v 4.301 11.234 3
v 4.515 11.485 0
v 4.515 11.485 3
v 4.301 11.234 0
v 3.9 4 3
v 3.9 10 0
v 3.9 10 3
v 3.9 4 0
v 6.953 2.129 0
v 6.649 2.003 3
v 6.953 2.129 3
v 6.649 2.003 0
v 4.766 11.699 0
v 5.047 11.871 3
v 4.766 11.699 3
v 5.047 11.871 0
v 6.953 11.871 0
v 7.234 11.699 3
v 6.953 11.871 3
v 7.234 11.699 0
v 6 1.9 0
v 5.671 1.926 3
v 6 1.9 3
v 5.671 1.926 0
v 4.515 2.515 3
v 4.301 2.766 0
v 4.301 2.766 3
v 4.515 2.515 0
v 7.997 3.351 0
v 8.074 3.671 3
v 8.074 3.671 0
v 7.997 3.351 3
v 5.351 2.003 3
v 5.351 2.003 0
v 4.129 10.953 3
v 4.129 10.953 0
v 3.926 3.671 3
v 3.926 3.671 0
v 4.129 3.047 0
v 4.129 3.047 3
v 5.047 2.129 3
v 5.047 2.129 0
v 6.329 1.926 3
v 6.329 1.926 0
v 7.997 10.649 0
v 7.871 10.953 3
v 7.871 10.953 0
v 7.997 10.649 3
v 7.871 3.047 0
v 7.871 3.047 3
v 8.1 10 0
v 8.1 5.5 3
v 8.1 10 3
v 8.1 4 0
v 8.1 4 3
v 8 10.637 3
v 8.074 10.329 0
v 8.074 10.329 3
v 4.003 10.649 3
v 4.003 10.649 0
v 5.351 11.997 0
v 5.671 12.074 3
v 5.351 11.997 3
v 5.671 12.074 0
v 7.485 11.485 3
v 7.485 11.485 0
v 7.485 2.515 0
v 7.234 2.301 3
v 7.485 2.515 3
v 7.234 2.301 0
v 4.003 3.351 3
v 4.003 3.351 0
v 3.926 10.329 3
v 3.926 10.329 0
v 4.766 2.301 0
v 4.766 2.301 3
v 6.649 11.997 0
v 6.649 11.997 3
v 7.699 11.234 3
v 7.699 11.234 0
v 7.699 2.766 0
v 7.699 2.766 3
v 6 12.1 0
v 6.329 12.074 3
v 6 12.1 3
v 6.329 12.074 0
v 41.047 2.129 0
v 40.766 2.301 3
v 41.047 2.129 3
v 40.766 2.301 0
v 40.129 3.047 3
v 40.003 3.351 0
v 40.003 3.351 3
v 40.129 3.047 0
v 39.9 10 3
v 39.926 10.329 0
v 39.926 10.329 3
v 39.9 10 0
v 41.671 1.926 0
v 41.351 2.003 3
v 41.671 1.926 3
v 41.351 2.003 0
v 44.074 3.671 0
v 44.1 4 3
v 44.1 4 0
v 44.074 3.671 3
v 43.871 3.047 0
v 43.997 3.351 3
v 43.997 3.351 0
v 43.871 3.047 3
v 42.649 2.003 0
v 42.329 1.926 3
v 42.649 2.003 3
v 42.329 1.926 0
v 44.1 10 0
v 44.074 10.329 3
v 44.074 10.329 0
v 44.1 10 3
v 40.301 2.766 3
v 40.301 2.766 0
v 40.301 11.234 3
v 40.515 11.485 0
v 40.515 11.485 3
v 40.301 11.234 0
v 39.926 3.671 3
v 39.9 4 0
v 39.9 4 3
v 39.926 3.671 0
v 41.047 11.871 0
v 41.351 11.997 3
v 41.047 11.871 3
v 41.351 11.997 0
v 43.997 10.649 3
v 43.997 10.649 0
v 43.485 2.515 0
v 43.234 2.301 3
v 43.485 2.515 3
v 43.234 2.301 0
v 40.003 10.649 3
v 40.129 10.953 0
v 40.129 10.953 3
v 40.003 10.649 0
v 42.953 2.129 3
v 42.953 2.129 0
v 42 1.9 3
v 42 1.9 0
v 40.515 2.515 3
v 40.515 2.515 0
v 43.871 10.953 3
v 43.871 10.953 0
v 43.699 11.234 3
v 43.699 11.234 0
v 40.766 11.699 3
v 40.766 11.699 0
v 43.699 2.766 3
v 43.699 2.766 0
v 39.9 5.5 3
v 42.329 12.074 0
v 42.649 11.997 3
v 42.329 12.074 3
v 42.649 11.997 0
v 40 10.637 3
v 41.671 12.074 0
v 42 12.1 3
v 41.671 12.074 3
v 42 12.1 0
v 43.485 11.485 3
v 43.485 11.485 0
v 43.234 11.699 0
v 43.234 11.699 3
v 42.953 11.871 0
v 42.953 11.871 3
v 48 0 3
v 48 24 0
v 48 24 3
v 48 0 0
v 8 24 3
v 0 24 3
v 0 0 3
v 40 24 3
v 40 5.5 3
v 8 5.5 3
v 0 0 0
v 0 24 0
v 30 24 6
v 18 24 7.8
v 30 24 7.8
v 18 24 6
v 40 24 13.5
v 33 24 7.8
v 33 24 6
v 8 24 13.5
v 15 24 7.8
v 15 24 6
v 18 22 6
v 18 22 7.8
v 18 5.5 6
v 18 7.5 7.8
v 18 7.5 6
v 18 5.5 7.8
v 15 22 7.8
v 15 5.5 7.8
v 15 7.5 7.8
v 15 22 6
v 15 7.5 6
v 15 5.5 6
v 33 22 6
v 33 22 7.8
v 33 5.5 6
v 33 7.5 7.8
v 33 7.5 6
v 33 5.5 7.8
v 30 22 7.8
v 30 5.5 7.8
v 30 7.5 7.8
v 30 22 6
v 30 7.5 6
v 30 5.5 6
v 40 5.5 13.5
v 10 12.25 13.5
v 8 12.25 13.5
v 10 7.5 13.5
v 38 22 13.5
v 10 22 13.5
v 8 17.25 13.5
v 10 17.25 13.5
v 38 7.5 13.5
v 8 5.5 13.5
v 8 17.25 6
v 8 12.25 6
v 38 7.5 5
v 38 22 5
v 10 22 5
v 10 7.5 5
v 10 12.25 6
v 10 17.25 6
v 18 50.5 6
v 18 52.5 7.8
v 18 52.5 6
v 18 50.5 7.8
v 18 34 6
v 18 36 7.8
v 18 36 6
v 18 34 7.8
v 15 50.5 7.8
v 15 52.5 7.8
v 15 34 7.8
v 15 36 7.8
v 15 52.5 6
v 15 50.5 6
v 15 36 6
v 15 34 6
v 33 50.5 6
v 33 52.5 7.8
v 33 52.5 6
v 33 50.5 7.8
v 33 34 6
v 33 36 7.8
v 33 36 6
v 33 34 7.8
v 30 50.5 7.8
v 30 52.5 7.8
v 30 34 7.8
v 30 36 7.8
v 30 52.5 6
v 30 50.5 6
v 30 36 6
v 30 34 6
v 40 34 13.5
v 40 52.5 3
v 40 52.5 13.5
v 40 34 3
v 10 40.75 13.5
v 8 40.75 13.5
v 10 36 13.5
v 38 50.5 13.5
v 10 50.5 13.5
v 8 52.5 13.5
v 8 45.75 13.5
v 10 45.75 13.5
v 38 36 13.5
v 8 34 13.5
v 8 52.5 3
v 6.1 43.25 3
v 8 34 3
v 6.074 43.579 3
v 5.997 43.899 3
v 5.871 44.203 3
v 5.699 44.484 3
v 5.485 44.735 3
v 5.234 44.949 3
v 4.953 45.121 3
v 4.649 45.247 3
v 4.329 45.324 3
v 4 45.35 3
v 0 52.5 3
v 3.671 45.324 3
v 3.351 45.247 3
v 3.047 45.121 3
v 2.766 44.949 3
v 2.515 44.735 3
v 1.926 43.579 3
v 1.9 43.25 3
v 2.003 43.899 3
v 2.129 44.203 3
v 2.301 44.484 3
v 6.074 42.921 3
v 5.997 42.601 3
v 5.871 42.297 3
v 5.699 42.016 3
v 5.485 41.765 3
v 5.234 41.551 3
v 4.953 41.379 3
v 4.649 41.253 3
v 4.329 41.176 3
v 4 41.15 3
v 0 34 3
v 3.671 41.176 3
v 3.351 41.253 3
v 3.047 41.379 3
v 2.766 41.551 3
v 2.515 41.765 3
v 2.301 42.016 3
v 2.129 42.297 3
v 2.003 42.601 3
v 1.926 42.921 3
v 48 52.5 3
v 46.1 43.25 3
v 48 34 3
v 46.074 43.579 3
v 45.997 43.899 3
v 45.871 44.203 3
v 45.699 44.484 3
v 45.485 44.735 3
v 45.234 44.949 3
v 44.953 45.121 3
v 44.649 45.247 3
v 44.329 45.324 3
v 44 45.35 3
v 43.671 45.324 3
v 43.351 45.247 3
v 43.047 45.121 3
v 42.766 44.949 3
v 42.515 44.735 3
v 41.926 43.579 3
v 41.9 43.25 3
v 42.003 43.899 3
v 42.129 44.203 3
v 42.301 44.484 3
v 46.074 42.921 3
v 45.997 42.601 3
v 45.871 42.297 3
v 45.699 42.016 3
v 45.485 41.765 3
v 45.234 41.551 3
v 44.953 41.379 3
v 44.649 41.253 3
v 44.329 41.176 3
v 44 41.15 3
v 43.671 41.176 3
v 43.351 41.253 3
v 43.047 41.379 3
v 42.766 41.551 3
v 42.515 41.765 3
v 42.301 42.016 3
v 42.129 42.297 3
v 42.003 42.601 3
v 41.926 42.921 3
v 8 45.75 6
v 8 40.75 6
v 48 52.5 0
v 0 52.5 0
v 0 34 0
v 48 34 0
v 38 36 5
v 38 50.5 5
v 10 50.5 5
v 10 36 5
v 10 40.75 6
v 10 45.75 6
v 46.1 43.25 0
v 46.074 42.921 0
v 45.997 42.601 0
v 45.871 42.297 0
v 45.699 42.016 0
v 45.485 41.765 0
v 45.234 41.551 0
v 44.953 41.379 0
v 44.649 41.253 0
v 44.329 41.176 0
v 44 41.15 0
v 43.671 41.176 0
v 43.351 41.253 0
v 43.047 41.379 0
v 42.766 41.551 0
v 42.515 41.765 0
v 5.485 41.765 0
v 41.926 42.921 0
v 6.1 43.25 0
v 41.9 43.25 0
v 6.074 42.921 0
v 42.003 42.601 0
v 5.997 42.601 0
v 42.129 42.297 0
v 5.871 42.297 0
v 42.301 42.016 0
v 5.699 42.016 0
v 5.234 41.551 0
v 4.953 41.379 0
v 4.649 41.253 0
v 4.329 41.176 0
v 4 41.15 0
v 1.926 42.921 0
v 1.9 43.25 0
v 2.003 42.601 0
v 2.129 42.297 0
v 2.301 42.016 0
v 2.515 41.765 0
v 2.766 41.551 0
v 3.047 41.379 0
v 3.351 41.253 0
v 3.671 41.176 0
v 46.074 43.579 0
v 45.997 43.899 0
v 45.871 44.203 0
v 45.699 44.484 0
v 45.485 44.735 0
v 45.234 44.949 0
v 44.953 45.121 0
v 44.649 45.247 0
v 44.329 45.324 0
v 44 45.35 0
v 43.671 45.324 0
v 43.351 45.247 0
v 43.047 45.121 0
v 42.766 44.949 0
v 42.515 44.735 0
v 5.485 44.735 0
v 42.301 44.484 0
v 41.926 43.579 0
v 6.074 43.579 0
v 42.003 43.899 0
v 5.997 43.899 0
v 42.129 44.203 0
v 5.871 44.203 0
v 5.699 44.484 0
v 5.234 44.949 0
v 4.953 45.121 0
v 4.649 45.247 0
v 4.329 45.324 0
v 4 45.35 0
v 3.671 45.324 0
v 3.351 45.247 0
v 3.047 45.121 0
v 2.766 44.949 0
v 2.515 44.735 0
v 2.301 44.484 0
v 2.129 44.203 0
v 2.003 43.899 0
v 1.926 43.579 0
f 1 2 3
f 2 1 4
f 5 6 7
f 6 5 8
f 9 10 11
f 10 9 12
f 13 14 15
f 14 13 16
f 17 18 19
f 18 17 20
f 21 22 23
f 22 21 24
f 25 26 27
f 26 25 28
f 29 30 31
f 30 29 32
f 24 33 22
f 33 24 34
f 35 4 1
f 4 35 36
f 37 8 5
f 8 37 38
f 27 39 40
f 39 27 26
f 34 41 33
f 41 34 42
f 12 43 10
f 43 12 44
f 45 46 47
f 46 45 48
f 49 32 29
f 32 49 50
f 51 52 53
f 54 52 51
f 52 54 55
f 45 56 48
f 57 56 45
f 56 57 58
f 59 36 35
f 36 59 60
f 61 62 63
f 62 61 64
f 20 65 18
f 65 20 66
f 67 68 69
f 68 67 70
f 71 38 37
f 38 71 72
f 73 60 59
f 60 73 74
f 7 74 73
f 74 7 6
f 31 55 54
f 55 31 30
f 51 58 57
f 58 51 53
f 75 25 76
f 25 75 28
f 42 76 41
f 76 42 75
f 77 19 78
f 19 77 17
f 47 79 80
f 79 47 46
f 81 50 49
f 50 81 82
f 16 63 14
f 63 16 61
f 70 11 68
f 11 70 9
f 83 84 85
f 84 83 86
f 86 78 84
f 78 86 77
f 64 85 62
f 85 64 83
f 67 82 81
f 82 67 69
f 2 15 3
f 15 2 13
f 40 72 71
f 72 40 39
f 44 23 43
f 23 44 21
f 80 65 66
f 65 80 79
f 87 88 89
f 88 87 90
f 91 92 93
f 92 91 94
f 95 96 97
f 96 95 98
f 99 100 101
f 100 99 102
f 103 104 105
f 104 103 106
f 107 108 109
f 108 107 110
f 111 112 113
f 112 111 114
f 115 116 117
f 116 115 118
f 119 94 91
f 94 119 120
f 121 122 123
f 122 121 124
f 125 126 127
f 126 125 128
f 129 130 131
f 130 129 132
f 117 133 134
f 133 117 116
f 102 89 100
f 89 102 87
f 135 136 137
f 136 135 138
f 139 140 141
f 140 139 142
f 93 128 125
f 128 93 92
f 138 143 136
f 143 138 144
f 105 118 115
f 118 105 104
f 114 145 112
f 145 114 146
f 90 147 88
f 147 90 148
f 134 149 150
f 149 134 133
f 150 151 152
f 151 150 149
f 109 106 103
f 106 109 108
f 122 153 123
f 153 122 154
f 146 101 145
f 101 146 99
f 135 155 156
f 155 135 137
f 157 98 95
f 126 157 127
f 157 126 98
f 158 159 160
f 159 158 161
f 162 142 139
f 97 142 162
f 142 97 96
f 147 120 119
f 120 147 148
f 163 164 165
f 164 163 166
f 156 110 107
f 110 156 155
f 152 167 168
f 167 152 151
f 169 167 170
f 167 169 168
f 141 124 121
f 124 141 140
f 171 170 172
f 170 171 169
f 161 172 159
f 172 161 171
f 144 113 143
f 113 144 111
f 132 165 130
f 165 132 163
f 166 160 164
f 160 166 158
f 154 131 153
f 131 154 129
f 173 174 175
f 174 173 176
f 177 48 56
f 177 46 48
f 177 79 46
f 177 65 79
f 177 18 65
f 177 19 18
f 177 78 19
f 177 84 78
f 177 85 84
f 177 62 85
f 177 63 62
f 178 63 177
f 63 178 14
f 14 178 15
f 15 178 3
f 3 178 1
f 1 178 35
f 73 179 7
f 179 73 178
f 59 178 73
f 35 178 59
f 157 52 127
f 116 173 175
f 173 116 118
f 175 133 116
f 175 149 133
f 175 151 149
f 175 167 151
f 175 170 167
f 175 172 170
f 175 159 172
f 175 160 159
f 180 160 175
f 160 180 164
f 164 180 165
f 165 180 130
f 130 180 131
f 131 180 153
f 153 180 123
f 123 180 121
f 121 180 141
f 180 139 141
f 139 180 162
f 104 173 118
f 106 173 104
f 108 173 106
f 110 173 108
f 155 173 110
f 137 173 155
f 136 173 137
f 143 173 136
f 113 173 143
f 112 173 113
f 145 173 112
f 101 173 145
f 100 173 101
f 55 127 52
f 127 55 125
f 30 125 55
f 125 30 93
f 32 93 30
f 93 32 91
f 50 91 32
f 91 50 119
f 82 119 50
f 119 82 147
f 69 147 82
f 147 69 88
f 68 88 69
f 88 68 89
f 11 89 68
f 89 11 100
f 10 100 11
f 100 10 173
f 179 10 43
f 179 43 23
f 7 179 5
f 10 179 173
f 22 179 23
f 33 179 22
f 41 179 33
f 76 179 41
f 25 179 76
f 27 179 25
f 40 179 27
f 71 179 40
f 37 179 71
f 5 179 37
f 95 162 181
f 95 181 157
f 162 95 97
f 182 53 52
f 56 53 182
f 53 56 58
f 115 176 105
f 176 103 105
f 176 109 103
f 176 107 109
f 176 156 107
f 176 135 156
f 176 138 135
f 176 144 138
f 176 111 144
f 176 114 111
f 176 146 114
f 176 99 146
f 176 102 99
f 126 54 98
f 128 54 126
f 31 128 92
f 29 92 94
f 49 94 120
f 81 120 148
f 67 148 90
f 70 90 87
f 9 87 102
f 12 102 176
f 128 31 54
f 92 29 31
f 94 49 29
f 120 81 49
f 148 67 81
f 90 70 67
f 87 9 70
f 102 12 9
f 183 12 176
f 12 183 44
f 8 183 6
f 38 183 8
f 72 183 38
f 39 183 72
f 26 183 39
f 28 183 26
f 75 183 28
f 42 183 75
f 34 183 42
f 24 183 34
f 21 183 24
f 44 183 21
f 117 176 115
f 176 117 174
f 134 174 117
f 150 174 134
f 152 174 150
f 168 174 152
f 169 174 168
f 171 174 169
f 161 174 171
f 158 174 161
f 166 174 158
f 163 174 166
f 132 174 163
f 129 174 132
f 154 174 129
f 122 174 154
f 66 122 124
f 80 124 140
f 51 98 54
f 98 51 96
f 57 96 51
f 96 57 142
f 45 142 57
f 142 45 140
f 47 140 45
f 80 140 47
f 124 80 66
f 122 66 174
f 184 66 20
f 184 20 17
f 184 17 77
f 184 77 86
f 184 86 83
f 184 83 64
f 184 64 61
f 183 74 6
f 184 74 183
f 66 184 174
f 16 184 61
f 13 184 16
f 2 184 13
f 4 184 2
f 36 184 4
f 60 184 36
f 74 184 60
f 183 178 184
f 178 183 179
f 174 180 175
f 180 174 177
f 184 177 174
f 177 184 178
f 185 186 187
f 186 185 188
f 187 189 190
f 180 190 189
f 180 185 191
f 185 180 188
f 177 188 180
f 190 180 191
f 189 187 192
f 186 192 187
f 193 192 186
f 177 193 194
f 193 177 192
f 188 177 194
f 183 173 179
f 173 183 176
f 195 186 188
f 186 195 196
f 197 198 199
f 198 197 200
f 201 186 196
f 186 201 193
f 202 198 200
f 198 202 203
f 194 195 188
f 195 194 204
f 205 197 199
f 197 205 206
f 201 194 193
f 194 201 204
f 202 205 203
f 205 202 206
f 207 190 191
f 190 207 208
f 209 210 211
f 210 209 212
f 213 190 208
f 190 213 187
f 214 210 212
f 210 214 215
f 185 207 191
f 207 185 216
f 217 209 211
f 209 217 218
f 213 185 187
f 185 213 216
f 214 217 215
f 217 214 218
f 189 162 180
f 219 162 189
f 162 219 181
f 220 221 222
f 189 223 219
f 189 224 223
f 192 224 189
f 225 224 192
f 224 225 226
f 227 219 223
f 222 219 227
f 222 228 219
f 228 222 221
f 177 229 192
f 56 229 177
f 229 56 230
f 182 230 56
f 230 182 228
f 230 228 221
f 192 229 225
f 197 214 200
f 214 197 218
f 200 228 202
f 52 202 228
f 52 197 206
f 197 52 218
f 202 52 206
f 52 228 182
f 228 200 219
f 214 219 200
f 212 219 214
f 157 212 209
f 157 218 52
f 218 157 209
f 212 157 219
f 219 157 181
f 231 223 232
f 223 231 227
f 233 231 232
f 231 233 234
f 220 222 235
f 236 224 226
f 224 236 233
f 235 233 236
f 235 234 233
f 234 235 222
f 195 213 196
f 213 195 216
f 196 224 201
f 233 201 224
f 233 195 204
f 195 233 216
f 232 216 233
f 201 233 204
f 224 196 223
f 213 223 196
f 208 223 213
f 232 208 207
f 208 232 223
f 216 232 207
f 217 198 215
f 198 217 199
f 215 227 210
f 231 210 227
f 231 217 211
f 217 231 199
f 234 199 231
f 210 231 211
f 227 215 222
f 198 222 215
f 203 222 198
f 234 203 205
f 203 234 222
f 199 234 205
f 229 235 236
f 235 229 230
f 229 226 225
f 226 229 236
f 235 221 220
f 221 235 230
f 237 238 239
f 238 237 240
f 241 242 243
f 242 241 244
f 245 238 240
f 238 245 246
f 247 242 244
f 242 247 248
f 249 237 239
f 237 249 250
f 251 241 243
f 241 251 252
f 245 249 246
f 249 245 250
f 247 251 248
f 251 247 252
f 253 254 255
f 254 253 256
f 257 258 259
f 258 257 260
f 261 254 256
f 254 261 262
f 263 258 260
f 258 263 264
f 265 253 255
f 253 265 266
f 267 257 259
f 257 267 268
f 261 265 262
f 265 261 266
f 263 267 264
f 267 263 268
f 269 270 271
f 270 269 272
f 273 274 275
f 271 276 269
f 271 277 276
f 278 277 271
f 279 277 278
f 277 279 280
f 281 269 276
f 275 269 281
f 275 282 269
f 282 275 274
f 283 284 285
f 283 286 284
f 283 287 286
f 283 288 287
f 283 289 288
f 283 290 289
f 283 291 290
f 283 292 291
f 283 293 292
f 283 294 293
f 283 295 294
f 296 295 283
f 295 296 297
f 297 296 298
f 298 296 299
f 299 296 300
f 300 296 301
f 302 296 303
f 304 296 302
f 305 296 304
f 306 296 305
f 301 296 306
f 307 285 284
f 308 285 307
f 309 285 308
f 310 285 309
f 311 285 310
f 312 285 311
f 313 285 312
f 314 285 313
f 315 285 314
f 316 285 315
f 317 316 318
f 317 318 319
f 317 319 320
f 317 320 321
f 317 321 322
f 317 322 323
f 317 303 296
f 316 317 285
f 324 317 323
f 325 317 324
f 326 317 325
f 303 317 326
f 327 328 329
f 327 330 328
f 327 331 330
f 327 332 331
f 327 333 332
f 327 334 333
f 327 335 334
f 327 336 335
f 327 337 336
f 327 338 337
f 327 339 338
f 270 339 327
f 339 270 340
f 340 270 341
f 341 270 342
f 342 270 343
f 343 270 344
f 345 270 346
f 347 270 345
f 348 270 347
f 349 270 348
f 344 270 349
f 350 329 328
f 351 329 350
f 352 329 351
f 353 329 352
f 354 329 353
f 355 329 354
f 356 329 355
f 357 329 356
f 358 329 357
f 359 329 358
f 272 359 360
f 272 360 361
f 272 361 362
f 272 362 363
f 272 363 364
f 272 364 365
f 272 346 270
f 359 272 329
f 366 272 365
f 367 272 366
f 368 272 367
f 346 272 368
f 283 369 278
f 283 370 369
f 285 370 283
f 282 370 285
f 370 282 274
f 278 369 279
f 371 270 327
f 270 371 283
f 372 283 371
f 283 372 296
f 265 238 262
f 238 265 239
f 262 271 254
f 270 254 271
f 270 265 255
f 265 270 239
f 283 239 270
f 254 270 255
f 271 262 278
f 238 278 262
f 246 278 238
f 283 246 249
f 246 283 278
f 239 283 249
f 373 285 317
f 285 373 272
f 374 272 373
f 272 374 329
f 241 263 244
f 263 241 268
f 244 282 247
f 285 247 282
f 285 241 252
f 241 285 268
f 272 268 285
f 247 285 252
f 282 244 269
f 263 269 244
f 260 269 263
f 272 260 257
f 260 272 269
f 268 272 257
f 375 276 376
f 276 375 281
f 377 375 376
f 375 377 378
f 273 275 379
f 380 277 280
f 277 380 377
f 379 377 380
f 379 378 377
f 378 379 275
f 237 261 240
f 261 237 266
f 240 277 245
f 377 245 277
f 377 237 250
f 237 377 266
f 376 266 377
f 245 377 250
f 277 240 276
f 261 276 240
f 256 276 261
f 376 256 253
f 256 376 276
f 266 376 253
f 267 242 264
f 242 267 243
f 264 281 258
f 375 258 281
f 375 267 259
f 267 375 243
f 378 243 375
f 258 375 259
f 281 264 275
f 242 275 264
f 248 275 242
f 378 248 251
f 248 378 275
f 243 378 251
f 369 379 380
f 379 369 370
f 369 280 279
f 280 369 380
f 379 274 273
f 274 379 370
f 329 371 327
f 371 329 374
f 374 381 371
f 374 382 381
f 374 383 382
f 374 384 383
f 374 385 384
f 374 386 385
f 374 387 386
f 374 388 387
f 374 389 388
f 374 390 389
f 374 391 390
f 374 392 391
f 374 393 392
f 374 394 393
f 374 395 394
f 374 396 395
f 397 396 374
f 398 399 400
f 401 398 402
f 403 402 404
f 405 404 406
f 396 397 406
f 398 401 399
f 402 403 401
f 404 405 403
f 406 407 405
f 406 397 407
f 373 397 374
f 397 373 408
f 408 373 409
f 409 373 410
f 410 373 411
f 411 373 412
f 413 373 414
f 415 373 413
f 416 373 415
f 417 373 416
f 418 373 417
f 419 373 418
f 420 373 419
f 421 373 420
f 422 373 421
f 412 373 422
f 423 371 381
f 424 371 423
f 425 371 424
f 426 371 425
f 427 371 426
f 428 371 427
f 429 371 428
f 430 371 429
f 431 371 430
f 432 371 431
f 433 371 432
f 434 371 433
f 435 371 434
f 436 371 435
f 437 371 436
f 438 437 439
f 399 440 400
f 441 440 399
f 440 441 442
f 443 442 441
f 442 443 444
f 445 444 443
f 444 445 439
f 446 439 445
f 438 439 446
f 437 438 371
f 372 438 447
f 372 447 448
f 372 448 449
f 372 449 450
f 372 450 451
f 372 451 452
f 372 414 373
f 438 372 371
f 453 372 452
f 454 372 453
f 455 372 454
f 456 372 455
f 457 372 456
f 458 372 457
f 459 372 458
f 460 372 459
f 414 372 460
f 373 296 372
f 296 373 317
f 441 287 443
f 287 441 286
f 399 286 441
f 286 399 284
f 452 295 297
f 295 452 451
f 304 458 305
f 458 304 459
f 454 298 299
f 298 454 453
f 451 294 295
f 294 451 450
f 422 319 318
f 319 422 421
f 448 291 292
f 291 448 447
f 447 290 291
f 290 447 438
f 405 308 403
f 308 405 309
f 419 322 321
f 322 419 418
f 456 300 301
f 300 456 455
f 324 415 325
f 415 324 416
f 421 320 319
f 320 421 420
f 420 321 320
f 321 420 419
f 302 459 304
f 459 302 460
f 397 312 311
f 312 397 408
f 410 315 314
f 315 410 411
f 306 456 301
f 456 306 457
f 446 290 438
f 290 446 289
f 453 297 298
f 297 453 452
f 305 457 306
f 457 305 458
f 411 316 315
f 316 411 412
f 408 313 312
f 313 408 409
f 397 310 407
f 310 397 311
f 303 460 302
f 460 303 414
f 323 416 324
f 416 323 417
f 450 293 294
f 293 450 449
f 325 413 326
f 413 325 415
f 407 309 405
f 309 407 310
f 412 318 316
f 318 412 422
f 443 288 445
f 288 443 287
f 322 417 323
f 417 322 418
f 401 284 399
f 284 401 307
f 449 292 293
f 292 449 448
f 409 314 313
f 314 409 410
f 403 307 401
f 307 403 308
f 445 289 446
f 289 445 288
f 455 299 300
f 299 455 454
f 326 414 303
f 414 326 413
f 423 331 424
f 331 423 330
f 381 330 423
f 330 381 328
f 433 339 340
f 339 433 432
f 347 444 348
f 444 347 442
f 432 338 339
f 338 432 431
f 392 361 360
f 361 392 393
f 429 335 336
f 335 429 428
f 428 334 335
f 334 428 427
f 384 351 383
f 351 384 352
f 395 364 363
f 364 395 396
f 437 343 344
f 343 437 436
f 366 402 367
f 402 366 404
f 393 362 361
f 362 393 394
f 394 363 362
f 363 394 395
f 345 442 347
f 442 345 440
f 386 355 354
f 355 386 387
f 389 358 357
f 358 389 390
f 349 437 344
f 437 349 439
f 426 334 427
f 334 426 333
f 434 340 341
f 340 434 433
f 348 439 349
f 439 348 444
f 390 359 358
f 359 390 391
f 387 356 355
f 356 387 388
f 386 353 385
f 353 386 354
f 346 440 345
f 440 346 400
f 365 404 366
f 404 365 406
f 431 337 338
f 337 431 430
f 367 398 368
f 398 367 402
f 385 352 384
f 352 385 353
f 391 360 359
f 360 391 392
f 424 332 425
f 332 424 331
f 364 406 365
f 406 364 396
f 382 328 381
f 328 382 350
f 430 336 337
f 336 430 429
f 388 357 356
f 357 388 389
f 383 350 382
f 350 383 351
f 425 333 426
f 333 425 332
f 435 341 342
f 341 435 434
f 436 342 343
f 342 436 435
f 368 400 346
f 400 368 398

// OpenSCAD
// Adjustable bracket for the pop-door position reed switches (J3: DOOR_CLOSED_SW,
// DOOR_OPEN_SW). Holds a standard surface-mount reed switch (~27 x 14 x 8 mm body)
// on the door frame. The slotted holes let you fine-tune where it trips. The matching
// magnet holder screws to the door leaf.
// part = "switch" | "magnet" | "all".  Print: PETG, 100% infill (small parts).

part = "all";
$fn = 40;

sw = [28, 14.5, 8.5];     // reed switch body + clearance
magnet = [28, 14.5, 8.5]; // matching magnet body (same housing in most kits)
wall = 2;
slot_len = 12;            // adjustment travel
screw_d = 4.2;

module slotted_plate(len) {
    difference() {
        cube([len, 24, 3]);
        for (x = [6, len - 6]) hull() {
            translate([x, 4, -1]) cylinder(d = screw_d, h = 5);
            translate([x, 4 + slot_len / 2, -1]) cylinder(d = screw_d, h = 5);
        }
    }
}

module cradle(body) {
    difference() {
        cube([body[0] + 2 * wall, body[1] + 2 * wall, body[2] + wall]);
        translate([wall, wall, wall]) cube([body[0], body[1], body[2] + 1]);
        // zip-tie slots
        for (x = [wall + 5, body[0] + wall - 8]) translate([x, -1, wall + 1]) cube([3, body[1] + 2 * wall + 2, 1.8]);
        // cable exit
        translate([-1, wall + body[1] / 2 - 2.5, wall + 1]) cube([wall + 2, 5, body[2]]);
    }
}

module switch_bracket() {
    slotted_plate(sw[0] + 2 * wall + 16);
    translate([8, 24 - (sw[1] + 2 * wall), 3]) cradle(sw);
}

module magnet_holder() {
    difference() {
        union() {
            cube([magnet[0] + 2 * wall + 16, magnet[1] + 2 * wall, 3]);
            translate([8, 0, 3]) cradle(magnet);
        }
        for (x = [4, magnet[0] + 2 * wall + 12]) translate([x, (magnet[1] + 2 * wall) / 2, -1]) cylinder(d = screw_d, h = 5);
    }
}

if (part == "switch") switch_bracket();
else if (part == "magnet") magnet_holder();
else { switch_bracket(); translate([0, 34, 0]) magnet_holder(); }
